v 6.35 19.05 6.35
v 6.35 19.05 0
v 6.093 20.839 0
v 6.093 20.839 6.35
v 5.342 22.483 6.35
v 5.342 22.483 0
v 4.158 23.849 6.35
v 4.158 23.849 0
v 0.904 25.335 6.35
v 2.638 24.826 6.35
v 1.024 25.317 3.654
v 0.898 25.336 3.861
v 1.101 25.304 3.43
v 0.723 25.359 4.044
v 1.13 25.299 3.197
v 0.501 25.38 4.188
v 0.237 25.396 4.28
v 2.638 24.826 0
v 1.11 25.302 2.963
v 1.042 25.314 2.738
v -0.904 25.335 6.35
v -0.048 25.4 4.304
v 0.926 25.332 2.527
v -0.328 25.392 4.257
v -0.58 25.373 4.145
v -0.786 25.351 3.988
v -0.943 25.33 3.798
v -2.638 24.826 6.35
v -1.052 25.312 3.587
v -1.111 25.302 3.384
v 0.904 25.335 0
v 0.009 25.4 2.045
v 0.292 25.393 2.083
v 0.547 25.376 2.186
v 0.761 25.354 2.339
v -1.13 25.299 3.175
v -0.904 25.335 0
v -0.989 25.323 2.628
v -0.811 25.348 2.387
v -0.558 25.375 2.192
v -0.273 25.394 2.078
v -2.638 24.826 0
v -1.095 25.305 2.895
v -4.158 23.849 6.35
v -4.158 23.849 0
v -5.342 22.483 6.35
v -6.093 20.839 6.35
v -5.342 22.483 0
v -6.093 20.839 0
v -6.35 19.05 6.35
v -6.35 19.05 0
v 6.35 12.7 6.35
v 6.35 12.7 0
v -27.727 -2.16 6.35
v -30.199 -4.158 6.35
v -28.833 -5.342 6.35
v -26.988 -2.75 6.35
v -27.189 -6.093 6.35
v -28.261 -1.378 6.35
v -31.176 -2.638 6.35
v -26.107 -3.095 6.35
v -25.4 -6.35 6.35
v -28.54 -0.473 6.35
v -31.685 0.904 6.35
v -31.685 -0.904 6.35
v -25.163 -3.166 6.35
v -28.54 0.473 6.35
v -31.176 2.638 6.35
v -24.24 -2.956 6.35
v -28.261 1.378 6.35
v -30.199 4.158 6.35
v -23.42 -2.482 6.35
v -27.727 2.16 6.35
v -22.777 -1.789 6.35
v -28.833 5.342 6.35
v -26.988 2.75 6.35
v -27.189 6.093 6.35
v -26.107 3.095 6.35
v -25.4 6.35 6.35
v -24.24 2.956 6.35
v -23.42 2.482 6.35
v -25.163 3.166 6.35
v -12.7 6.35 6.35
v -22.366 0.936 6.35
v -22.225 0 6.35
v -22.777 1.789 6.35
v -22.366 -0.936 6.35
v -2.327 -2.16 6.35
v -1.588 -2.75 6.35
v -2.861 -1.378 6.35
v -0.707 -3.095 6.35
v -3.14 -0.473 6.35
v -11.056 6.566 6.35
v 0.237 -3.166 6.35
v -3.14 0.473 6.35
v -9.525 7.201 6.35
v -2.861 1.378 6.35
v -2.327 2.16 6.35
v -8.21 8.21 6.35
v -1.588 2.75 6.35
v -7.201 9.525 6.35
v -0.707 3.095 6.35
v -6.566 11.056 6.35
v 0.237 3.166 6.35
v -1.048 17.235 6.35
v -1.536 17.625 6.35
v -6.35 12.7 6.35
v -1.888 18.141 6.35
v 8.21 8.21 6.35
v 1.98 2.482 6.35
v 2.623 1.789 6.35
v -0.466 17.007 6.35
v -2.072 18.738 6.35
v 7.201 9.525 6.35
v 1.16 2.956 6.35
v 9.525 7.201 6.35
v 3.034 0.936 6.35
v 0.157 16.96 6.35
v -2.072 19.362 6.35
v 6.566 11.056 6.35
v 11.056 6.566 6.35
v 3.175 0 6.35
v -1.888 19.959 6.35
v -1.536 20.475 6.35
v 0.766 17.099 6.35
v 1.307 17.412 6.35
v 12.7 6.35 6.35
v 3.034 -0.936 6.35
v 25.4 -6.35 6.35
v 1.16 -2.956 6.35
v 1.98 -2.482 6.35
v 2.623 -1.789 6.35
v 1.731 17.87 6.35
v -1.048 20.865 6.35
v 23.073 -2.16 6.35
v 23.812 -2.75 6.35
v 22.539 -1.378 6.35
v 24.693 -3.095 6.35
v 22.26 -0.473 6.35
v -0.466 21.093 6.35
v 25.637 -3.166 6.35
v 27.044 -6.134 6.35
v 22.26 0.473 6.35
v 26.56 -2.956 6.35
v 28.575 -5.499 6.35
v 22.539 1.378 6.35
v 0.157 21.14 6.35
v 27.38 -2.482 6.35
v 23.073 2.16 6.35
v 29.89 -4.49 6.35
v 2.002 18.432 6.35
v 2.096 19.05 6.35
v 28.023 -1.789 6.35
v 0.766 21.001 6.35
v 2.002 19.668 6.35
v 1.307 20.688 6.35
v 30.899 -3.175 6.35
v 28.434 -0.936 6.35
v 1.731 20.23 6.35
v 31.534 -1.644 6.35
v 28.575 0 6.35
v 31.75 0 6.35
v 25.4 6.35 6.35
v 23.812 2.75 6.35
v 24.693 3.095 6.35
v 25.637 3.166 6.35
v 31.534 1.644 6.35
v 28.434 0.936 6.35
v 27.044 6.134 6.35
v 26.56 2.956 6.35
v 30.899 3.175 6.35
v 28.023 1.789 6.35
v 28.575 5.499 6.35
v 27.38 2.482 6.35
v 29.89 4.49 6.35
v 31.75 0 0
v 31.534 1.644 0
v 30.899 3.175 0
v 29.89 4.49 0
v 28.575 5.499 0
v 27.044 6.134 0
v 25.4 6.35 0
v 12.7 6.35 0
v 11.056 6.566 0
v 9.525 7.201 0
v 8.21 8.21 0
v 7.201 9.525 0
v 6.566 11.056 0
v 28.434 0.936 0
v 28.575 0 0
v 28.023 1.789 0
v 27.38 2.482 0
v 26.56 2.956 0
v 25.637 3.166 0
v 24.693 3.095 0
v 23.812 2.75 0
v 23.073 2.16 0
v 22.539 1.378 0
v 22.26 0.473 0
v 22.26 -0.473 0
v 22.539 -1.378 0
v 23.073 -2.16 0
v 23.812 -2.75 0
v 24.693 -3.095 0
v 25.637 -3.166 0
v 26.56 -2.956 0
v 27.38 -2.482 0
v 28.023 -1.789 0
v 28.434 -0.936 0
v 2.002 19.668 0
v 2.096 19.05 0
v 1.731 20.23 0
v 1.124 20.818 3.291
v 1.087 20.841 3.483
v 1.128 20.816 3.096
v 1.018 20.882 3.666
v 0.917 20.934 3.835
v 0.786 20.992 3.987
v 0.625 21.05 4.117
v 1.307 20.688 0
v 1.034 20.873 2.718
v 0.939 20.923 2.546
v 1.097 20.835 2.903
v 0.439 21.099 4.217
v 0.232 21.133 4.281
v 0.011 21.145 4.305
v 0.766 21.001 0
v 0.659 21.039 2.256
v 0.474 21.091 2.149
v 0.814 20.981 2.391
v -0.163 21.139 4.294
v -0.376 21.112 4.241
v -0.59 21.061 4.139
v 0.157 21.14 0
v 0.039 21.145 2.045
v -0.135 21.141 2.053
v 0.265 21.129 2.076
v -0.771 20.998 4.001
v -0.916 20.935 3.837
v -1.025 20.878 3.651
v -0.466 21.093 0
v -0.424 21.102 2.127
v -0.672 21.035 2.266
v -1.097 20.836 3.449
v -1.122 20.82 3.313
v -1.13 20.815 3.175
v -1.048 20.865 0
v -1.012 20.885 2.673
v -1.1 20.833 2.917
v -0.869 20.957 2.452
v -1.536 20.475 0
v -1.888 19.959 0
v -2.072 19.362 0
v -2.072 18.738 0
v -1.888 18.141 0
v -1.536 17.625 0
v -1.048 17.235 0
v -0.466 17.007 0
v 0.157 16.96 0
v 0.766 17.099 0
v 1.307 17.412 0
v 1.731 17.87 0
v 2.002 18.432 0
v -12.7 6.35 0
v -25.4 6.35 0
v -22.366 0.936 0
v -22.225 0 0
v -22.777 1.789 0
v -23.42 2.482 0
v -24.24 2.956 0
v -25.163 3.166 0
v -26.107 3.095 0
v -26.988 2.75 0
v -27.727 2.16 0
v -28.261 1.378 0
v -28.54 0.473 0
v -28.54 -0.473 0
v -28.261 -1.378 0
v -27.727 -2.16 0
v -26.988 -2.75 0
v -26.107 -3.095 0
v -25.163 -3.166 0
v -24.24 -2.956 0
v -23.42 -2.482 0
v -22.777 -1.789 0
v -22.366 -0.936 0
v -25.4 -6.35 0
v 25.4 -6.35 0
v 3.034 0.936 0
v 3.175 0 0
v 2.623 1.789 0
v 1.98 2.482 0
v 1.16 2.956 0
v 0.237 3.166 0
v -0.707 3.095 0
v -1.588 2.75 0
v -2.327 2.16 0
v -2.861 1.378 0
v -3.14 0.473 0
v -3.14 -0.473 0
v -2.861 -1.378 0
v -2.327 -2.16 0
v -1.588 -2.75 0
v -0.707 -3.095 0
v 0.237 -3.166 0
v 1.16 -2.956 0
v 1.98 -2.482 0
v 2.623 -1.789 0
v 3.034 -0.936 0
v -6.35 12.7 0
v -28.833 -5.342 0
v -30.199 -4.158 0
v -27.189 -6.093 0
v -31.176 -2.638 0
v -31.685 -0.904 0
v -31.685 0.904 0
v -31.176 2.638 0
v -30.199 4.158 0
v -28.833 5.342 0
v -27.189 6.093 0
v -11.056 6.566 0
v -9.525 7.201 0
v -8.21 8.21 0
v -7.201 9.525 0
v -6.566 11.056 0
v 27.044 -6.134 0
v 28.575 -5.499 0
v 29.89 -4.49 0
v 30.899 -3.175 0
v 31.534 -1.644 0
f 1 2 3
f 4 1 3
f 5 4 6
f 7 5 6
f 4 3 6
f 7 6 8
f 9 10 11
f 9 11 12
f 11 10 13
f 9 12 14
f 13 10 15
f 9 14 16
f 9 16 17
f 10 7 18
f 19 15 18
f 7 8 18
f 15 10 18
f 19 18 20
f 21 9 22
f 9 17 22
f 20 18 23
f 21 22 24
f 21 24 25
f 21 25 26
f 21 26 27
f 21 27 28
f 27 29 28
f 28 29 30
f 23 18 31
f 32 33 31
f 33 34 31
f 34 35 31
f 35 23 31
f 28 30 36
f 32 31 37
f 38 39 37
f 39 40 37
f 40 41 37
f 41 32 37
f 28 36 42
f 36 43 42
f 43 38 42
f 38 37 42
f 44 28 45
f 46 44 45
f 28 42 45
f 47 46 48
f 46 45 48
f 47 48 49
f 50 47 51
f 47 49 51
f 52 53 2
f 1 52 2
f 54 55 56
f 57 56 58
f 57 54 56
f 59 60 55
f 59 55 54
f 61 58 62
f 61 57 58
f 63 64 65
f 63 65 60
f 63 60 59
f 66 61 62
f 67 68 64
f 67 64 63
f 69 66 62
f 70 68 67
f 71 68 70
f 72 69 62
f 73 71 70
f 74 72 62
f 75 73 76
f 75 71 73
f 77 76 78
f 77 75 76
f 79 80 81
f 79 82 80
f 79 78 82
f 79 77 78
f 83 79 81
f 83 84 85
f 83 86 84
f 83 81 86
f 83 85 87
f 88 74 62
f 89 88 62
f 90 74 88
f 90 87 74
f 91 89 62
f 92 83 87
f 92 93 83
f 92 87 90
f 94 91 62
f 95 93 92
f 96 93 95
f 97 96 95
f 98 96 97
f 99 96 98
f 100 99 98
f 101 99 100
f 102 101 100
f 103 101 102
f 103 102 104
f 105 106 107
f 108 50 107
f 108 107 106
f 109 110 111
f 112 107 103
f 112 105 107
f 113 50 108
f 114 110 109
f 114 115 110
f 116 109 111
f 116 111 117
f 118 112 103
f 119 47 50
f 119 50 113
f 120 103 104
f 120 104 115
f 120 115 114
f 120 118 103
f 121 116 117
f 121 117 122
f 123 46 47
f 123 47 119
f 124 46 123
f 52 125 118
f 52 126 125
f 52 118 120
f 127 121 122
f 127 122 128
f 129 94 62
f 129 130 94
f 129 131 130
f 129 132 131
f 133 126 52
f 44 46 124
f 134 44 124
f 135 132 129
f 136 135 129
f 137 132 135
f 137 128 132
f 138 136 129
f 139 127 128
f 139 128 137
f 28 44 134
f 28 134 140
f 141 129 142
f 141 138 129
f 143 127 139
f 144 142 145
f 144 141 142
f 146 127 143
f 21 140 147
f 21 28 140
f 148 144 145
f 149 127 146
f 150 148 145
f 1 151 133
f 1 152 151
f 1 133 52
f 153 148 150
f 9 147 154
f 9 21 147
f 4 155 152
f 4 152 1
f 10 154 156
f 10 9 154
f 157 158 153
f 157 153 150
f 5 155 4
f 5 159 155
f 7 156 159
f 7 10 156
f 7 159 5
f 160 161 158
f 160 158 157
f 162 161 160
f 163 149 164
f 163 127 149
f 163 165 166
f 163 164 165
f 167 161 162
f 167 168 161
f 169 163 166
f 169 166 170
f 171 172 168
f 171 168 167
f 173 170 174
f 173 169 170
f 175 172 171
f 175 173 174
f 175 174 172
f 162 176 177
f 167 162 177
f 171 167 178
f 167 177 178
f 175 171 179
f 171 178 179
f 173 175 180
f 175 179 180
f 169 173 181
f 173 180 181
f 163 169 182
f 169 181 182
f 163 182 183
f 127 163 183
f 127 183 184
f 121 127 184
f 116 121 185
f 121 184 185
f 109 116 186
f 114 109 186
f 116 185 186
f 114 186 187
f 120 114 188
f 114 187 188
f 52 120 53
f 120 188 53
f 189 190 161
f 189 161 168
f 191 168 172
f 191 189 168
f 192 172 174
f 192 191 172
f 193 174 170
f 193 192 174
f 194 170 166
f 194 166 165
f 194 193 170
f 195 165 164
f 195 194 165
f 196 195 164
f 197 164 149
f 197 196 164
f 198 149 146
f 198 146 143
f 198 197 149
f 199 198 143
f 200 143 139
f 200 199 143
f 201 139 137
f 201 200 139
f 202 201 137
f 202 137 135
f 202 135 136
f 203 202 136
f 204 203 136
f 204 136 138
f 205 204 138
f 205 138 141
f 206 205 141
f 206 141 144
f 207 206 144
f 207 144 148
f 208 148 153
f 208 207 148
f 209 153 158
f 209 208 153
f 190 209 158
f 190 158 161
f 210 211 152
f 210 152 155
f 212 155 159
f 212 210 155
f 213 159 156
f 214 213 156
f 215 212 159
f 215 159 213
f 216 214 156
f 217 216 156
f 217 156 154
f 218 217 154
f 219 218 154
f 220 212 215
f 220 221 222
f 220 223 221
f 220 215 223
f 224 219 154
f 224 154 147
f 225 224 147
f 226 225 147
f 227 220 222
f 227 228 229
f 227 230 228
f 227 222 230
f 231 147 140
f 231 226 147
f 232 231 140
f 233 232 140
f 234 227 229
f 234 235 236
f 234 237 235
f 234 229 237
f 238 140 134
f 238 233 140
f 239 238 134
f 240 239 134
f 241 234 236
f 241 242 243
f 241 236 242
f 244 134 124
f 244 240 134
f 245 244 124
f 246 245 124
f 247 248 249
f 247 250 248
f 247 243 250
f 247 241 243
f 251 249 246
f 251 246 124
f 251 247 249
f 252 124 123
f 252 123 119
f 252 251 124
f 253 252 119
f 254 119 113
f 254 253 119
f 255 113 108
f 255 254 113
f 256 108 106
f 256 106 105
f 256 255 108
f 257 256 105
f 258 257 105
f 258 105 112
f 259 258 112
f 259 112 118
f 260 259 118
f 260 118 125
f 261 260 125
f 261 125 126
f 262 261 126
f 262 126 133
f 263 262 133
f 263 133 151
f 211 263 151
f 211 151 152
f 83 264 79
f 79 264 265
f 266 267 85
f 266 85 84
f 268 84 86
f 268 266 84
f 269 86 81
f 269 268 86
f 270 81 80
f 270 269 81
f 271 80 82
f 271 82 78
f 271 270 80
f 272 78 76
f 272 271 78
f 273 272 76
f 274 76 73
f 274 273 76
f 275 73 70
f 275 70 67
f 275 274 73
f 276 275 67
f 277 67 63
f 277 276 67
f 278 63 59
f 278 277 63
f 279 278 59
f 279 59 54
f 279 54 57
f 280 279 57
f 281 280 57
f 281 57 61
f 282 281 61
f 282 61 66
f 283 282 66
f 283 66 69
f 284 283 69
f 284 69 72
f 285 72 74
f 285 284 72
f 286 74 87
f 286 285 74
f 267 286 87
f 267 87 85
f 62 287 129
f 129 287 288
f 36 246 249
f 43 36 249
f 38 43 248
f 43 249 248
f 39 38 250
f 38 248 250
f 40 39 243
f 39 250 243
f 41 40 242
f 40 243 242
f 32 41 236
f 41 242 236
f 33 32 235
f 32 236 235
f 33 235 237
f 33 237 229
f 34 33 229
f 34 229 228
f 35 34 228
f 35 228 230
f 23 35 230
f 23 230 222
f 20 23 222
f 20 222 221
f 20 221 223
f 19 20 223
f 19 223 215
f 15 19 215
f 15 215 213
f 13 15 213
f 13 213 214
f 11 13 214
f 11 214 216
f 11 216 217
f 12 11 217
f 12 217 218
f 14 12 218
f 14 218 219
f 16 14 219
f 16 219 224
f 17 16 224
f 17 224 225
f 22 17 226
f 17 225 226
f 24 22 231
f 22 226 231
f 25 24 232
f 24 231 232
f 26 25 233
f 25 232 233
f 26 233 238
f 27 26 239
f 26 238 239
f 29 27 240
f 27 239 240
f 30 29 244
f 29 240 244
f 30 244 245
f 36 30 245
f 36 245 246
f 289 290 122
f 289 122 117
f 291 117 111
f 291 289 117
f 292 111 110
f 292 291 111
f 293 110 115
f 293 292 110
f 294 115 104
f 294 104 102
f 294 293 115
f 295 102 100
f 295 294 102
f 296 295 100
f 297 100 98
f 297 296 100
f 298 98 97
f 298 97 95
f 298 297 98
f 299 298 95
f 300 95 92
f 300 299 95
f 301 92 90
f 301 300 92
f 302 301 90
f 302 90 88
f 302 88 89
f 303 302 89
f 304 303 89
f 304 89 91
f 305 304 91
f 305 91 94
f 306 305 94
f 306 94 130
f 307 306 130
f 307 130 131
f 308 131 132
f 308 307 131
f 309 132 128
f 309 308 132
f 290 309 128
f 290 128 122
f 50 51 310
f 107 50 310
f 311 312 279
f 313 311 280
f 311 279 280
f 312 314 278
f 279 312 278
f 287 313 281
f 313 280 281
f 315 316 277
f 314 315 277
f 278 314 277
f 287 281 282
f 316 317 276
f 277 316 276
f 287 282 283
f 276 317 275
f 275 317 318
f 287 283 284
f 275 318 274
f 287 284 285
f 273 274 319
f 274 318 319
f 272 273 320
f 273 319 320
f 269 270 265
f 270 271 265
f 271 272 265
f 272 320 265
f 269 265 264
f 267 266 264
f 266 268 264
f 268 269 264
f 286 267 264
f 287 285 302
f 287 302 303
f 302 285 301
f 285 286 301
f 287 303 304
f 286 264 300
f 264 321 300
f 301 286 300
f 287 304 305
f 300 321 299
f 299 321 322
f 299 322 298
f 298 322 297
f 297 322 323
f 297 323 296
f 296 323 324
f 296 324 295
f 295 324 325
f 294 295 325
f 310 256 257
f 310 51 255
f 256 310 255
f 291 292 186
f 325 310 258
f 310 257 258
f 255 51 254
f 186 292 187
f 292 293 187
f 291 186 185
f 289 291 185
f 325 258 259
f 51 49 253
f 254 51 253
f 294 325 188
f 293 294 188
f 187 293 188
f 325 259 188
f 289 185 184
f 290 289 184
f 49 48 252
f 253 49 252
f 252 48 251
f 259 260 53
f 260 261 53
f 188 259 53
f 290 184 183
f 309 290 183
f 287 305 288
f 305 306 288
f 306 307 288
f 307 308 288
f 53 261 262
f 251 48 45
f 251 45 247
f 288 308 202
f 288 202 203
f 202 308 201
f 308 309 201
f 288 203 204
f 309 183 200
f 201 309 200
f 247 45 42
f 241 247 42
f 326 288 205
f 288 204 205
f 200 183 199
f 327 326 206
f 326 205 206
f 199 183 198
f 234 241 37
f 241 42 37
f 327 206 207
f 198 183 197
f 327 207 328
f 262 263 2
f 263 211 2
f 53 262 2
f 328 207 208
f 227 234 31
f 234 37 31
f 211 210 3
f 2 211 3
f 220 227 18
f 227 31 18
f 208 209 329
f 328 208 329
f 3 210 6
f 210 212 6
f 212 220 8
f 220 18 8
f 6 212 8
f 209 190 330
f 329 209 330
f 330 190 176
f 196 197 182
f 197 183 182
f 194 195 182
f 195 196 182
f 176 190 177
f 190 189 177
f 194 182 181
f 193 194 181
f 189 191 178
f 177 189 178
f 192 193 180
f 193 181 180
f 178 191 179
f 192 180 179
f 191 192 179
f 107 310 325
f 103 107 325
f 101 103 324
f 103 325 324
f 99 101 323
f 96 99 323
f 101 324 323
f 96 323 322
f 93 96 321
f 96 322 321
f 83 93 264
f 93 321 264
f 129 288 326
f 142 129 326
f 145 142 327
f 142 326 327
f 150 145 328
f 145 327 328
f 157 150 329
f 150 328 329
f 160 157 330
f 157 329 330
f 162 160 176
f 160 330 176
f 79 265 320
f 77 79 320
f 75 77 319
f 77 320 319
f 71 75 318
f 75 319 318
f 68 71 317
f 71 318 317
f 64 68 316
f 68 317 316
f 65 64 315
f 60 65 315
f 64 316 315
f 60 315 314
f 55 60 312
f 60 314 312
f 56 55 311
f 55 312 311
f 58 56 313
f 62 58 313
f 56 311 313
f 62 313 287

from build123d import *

# Parameters (mm, degrees)
F0_R     = 3.175
F0_R_2   = 2.0955
F1_DEPTH = 6.35
F5_D     = 2.2606
F5_DEPTH = 5.08
F5_START = 0.1014065
F5_TIP   = 0.6791527577


with BuildPart() as f1:
    # F0 (on Top) → F1 (new body)
    with BuildSketch(Plane.XY):
        with BuildLine():
            ThreePointArc((-25.4, -6.35), (-20.9098719395, -4.4901280605), (-19.05, 0))
            ThreePointArc((-19.05, 0), (-20.9098719395, 4.4901280605), (-25.4, 6.35))
            ThreePointArc((-25.4, 6.35), (-31.75, 0), (-25.4, -6.35))
        make_face()
        with Locations((-25.4, 0)):
            Circle(F0_R, mode=Mode.SUBTRACT)
        with BuildLine():
            ThreePointArc((-25.4, 6.35), (-20.9098719395, 4.4901280605), (-19.05, 0))
            ThreePointArc((-19.05, 0), (-20.9098719395, -4.4901280605), (-25.4, -6.35))
            Line((-25.4, -6.35), (25.4, -6.35))
            ThreePointArc((25.4, -6.35), (19.05, 0), (25.4, 6.35))
            Line((25.4, 6.35), (12.7, 6.35))
            ThreePointArc((12.7, 6.35), (8.2098719395, 8.2098719395), (6.35, 12.7))
            Line((6.35, 12.7), (6.35, 19.05))
            ThreePointArc((6.35, 19.05), (0, 12.7), (-6.35, 19.05))
            Line((-6.35, 19.05), (-6.35, 12.7))
            ThreePointArc((-6.35, 12.7), (-8.2098719395, 8.2098719395), (-12.7, 6.35))
            Line((-12.7, 6.35), (-25.4, 6.35))
        make_face()
        Circle(F0_R, mode=Mode.SUBTRACT)
        with BuildLine():
            ThreePointArc((25.4, 6.35), (19.05, 0), (25.4, -6.35))
            ThreePointArc((25.4, -6.35), (29.8901280605, -4.4901280605), (31.75, 0))
            ThreePointArc((31.75, 0), (29.8901280605, 4.4901280605), (25.4, 6.35))
        make_face()
        with Locations((25.4, 0)):
            Circle(F0_R, mode=Mode.SUBTRACT)
        with BuildLine():
            ThreePointArc((6.35, 19.05), (0, 25.4), (-6.35, 19.05))
            ThreePointArc((-6.35, 19.05), (0, 12.7), (6.35, 19.05))
        make_face()
        with Locations((0, 19.05)):
            Circle(F0_R_2, mode=Mode.SUBTRACT)
    extrude(amount=F1_DEPTH)

    # F5
    # its depths count from where the whole tool has entered the part; down to there all is cleared
    with Locations(Plane(origin=(0, 25.4, 0), x_dir=(1, 0, 0), z_dir=(0, 1, 0)).offset(-F5_START)):
        with Locations((0, -3.175)):
            Hole(F5_D / 2, depth=F5_DEPTH)
            with Locations((0, 0, -(F5_DEPTH + F5_TIP / 2))):  # 118° drill point
                Cone(0, F5_D / 2, F5_TIP, mode=Mode.SUBTRACT)


solid = f1.part
